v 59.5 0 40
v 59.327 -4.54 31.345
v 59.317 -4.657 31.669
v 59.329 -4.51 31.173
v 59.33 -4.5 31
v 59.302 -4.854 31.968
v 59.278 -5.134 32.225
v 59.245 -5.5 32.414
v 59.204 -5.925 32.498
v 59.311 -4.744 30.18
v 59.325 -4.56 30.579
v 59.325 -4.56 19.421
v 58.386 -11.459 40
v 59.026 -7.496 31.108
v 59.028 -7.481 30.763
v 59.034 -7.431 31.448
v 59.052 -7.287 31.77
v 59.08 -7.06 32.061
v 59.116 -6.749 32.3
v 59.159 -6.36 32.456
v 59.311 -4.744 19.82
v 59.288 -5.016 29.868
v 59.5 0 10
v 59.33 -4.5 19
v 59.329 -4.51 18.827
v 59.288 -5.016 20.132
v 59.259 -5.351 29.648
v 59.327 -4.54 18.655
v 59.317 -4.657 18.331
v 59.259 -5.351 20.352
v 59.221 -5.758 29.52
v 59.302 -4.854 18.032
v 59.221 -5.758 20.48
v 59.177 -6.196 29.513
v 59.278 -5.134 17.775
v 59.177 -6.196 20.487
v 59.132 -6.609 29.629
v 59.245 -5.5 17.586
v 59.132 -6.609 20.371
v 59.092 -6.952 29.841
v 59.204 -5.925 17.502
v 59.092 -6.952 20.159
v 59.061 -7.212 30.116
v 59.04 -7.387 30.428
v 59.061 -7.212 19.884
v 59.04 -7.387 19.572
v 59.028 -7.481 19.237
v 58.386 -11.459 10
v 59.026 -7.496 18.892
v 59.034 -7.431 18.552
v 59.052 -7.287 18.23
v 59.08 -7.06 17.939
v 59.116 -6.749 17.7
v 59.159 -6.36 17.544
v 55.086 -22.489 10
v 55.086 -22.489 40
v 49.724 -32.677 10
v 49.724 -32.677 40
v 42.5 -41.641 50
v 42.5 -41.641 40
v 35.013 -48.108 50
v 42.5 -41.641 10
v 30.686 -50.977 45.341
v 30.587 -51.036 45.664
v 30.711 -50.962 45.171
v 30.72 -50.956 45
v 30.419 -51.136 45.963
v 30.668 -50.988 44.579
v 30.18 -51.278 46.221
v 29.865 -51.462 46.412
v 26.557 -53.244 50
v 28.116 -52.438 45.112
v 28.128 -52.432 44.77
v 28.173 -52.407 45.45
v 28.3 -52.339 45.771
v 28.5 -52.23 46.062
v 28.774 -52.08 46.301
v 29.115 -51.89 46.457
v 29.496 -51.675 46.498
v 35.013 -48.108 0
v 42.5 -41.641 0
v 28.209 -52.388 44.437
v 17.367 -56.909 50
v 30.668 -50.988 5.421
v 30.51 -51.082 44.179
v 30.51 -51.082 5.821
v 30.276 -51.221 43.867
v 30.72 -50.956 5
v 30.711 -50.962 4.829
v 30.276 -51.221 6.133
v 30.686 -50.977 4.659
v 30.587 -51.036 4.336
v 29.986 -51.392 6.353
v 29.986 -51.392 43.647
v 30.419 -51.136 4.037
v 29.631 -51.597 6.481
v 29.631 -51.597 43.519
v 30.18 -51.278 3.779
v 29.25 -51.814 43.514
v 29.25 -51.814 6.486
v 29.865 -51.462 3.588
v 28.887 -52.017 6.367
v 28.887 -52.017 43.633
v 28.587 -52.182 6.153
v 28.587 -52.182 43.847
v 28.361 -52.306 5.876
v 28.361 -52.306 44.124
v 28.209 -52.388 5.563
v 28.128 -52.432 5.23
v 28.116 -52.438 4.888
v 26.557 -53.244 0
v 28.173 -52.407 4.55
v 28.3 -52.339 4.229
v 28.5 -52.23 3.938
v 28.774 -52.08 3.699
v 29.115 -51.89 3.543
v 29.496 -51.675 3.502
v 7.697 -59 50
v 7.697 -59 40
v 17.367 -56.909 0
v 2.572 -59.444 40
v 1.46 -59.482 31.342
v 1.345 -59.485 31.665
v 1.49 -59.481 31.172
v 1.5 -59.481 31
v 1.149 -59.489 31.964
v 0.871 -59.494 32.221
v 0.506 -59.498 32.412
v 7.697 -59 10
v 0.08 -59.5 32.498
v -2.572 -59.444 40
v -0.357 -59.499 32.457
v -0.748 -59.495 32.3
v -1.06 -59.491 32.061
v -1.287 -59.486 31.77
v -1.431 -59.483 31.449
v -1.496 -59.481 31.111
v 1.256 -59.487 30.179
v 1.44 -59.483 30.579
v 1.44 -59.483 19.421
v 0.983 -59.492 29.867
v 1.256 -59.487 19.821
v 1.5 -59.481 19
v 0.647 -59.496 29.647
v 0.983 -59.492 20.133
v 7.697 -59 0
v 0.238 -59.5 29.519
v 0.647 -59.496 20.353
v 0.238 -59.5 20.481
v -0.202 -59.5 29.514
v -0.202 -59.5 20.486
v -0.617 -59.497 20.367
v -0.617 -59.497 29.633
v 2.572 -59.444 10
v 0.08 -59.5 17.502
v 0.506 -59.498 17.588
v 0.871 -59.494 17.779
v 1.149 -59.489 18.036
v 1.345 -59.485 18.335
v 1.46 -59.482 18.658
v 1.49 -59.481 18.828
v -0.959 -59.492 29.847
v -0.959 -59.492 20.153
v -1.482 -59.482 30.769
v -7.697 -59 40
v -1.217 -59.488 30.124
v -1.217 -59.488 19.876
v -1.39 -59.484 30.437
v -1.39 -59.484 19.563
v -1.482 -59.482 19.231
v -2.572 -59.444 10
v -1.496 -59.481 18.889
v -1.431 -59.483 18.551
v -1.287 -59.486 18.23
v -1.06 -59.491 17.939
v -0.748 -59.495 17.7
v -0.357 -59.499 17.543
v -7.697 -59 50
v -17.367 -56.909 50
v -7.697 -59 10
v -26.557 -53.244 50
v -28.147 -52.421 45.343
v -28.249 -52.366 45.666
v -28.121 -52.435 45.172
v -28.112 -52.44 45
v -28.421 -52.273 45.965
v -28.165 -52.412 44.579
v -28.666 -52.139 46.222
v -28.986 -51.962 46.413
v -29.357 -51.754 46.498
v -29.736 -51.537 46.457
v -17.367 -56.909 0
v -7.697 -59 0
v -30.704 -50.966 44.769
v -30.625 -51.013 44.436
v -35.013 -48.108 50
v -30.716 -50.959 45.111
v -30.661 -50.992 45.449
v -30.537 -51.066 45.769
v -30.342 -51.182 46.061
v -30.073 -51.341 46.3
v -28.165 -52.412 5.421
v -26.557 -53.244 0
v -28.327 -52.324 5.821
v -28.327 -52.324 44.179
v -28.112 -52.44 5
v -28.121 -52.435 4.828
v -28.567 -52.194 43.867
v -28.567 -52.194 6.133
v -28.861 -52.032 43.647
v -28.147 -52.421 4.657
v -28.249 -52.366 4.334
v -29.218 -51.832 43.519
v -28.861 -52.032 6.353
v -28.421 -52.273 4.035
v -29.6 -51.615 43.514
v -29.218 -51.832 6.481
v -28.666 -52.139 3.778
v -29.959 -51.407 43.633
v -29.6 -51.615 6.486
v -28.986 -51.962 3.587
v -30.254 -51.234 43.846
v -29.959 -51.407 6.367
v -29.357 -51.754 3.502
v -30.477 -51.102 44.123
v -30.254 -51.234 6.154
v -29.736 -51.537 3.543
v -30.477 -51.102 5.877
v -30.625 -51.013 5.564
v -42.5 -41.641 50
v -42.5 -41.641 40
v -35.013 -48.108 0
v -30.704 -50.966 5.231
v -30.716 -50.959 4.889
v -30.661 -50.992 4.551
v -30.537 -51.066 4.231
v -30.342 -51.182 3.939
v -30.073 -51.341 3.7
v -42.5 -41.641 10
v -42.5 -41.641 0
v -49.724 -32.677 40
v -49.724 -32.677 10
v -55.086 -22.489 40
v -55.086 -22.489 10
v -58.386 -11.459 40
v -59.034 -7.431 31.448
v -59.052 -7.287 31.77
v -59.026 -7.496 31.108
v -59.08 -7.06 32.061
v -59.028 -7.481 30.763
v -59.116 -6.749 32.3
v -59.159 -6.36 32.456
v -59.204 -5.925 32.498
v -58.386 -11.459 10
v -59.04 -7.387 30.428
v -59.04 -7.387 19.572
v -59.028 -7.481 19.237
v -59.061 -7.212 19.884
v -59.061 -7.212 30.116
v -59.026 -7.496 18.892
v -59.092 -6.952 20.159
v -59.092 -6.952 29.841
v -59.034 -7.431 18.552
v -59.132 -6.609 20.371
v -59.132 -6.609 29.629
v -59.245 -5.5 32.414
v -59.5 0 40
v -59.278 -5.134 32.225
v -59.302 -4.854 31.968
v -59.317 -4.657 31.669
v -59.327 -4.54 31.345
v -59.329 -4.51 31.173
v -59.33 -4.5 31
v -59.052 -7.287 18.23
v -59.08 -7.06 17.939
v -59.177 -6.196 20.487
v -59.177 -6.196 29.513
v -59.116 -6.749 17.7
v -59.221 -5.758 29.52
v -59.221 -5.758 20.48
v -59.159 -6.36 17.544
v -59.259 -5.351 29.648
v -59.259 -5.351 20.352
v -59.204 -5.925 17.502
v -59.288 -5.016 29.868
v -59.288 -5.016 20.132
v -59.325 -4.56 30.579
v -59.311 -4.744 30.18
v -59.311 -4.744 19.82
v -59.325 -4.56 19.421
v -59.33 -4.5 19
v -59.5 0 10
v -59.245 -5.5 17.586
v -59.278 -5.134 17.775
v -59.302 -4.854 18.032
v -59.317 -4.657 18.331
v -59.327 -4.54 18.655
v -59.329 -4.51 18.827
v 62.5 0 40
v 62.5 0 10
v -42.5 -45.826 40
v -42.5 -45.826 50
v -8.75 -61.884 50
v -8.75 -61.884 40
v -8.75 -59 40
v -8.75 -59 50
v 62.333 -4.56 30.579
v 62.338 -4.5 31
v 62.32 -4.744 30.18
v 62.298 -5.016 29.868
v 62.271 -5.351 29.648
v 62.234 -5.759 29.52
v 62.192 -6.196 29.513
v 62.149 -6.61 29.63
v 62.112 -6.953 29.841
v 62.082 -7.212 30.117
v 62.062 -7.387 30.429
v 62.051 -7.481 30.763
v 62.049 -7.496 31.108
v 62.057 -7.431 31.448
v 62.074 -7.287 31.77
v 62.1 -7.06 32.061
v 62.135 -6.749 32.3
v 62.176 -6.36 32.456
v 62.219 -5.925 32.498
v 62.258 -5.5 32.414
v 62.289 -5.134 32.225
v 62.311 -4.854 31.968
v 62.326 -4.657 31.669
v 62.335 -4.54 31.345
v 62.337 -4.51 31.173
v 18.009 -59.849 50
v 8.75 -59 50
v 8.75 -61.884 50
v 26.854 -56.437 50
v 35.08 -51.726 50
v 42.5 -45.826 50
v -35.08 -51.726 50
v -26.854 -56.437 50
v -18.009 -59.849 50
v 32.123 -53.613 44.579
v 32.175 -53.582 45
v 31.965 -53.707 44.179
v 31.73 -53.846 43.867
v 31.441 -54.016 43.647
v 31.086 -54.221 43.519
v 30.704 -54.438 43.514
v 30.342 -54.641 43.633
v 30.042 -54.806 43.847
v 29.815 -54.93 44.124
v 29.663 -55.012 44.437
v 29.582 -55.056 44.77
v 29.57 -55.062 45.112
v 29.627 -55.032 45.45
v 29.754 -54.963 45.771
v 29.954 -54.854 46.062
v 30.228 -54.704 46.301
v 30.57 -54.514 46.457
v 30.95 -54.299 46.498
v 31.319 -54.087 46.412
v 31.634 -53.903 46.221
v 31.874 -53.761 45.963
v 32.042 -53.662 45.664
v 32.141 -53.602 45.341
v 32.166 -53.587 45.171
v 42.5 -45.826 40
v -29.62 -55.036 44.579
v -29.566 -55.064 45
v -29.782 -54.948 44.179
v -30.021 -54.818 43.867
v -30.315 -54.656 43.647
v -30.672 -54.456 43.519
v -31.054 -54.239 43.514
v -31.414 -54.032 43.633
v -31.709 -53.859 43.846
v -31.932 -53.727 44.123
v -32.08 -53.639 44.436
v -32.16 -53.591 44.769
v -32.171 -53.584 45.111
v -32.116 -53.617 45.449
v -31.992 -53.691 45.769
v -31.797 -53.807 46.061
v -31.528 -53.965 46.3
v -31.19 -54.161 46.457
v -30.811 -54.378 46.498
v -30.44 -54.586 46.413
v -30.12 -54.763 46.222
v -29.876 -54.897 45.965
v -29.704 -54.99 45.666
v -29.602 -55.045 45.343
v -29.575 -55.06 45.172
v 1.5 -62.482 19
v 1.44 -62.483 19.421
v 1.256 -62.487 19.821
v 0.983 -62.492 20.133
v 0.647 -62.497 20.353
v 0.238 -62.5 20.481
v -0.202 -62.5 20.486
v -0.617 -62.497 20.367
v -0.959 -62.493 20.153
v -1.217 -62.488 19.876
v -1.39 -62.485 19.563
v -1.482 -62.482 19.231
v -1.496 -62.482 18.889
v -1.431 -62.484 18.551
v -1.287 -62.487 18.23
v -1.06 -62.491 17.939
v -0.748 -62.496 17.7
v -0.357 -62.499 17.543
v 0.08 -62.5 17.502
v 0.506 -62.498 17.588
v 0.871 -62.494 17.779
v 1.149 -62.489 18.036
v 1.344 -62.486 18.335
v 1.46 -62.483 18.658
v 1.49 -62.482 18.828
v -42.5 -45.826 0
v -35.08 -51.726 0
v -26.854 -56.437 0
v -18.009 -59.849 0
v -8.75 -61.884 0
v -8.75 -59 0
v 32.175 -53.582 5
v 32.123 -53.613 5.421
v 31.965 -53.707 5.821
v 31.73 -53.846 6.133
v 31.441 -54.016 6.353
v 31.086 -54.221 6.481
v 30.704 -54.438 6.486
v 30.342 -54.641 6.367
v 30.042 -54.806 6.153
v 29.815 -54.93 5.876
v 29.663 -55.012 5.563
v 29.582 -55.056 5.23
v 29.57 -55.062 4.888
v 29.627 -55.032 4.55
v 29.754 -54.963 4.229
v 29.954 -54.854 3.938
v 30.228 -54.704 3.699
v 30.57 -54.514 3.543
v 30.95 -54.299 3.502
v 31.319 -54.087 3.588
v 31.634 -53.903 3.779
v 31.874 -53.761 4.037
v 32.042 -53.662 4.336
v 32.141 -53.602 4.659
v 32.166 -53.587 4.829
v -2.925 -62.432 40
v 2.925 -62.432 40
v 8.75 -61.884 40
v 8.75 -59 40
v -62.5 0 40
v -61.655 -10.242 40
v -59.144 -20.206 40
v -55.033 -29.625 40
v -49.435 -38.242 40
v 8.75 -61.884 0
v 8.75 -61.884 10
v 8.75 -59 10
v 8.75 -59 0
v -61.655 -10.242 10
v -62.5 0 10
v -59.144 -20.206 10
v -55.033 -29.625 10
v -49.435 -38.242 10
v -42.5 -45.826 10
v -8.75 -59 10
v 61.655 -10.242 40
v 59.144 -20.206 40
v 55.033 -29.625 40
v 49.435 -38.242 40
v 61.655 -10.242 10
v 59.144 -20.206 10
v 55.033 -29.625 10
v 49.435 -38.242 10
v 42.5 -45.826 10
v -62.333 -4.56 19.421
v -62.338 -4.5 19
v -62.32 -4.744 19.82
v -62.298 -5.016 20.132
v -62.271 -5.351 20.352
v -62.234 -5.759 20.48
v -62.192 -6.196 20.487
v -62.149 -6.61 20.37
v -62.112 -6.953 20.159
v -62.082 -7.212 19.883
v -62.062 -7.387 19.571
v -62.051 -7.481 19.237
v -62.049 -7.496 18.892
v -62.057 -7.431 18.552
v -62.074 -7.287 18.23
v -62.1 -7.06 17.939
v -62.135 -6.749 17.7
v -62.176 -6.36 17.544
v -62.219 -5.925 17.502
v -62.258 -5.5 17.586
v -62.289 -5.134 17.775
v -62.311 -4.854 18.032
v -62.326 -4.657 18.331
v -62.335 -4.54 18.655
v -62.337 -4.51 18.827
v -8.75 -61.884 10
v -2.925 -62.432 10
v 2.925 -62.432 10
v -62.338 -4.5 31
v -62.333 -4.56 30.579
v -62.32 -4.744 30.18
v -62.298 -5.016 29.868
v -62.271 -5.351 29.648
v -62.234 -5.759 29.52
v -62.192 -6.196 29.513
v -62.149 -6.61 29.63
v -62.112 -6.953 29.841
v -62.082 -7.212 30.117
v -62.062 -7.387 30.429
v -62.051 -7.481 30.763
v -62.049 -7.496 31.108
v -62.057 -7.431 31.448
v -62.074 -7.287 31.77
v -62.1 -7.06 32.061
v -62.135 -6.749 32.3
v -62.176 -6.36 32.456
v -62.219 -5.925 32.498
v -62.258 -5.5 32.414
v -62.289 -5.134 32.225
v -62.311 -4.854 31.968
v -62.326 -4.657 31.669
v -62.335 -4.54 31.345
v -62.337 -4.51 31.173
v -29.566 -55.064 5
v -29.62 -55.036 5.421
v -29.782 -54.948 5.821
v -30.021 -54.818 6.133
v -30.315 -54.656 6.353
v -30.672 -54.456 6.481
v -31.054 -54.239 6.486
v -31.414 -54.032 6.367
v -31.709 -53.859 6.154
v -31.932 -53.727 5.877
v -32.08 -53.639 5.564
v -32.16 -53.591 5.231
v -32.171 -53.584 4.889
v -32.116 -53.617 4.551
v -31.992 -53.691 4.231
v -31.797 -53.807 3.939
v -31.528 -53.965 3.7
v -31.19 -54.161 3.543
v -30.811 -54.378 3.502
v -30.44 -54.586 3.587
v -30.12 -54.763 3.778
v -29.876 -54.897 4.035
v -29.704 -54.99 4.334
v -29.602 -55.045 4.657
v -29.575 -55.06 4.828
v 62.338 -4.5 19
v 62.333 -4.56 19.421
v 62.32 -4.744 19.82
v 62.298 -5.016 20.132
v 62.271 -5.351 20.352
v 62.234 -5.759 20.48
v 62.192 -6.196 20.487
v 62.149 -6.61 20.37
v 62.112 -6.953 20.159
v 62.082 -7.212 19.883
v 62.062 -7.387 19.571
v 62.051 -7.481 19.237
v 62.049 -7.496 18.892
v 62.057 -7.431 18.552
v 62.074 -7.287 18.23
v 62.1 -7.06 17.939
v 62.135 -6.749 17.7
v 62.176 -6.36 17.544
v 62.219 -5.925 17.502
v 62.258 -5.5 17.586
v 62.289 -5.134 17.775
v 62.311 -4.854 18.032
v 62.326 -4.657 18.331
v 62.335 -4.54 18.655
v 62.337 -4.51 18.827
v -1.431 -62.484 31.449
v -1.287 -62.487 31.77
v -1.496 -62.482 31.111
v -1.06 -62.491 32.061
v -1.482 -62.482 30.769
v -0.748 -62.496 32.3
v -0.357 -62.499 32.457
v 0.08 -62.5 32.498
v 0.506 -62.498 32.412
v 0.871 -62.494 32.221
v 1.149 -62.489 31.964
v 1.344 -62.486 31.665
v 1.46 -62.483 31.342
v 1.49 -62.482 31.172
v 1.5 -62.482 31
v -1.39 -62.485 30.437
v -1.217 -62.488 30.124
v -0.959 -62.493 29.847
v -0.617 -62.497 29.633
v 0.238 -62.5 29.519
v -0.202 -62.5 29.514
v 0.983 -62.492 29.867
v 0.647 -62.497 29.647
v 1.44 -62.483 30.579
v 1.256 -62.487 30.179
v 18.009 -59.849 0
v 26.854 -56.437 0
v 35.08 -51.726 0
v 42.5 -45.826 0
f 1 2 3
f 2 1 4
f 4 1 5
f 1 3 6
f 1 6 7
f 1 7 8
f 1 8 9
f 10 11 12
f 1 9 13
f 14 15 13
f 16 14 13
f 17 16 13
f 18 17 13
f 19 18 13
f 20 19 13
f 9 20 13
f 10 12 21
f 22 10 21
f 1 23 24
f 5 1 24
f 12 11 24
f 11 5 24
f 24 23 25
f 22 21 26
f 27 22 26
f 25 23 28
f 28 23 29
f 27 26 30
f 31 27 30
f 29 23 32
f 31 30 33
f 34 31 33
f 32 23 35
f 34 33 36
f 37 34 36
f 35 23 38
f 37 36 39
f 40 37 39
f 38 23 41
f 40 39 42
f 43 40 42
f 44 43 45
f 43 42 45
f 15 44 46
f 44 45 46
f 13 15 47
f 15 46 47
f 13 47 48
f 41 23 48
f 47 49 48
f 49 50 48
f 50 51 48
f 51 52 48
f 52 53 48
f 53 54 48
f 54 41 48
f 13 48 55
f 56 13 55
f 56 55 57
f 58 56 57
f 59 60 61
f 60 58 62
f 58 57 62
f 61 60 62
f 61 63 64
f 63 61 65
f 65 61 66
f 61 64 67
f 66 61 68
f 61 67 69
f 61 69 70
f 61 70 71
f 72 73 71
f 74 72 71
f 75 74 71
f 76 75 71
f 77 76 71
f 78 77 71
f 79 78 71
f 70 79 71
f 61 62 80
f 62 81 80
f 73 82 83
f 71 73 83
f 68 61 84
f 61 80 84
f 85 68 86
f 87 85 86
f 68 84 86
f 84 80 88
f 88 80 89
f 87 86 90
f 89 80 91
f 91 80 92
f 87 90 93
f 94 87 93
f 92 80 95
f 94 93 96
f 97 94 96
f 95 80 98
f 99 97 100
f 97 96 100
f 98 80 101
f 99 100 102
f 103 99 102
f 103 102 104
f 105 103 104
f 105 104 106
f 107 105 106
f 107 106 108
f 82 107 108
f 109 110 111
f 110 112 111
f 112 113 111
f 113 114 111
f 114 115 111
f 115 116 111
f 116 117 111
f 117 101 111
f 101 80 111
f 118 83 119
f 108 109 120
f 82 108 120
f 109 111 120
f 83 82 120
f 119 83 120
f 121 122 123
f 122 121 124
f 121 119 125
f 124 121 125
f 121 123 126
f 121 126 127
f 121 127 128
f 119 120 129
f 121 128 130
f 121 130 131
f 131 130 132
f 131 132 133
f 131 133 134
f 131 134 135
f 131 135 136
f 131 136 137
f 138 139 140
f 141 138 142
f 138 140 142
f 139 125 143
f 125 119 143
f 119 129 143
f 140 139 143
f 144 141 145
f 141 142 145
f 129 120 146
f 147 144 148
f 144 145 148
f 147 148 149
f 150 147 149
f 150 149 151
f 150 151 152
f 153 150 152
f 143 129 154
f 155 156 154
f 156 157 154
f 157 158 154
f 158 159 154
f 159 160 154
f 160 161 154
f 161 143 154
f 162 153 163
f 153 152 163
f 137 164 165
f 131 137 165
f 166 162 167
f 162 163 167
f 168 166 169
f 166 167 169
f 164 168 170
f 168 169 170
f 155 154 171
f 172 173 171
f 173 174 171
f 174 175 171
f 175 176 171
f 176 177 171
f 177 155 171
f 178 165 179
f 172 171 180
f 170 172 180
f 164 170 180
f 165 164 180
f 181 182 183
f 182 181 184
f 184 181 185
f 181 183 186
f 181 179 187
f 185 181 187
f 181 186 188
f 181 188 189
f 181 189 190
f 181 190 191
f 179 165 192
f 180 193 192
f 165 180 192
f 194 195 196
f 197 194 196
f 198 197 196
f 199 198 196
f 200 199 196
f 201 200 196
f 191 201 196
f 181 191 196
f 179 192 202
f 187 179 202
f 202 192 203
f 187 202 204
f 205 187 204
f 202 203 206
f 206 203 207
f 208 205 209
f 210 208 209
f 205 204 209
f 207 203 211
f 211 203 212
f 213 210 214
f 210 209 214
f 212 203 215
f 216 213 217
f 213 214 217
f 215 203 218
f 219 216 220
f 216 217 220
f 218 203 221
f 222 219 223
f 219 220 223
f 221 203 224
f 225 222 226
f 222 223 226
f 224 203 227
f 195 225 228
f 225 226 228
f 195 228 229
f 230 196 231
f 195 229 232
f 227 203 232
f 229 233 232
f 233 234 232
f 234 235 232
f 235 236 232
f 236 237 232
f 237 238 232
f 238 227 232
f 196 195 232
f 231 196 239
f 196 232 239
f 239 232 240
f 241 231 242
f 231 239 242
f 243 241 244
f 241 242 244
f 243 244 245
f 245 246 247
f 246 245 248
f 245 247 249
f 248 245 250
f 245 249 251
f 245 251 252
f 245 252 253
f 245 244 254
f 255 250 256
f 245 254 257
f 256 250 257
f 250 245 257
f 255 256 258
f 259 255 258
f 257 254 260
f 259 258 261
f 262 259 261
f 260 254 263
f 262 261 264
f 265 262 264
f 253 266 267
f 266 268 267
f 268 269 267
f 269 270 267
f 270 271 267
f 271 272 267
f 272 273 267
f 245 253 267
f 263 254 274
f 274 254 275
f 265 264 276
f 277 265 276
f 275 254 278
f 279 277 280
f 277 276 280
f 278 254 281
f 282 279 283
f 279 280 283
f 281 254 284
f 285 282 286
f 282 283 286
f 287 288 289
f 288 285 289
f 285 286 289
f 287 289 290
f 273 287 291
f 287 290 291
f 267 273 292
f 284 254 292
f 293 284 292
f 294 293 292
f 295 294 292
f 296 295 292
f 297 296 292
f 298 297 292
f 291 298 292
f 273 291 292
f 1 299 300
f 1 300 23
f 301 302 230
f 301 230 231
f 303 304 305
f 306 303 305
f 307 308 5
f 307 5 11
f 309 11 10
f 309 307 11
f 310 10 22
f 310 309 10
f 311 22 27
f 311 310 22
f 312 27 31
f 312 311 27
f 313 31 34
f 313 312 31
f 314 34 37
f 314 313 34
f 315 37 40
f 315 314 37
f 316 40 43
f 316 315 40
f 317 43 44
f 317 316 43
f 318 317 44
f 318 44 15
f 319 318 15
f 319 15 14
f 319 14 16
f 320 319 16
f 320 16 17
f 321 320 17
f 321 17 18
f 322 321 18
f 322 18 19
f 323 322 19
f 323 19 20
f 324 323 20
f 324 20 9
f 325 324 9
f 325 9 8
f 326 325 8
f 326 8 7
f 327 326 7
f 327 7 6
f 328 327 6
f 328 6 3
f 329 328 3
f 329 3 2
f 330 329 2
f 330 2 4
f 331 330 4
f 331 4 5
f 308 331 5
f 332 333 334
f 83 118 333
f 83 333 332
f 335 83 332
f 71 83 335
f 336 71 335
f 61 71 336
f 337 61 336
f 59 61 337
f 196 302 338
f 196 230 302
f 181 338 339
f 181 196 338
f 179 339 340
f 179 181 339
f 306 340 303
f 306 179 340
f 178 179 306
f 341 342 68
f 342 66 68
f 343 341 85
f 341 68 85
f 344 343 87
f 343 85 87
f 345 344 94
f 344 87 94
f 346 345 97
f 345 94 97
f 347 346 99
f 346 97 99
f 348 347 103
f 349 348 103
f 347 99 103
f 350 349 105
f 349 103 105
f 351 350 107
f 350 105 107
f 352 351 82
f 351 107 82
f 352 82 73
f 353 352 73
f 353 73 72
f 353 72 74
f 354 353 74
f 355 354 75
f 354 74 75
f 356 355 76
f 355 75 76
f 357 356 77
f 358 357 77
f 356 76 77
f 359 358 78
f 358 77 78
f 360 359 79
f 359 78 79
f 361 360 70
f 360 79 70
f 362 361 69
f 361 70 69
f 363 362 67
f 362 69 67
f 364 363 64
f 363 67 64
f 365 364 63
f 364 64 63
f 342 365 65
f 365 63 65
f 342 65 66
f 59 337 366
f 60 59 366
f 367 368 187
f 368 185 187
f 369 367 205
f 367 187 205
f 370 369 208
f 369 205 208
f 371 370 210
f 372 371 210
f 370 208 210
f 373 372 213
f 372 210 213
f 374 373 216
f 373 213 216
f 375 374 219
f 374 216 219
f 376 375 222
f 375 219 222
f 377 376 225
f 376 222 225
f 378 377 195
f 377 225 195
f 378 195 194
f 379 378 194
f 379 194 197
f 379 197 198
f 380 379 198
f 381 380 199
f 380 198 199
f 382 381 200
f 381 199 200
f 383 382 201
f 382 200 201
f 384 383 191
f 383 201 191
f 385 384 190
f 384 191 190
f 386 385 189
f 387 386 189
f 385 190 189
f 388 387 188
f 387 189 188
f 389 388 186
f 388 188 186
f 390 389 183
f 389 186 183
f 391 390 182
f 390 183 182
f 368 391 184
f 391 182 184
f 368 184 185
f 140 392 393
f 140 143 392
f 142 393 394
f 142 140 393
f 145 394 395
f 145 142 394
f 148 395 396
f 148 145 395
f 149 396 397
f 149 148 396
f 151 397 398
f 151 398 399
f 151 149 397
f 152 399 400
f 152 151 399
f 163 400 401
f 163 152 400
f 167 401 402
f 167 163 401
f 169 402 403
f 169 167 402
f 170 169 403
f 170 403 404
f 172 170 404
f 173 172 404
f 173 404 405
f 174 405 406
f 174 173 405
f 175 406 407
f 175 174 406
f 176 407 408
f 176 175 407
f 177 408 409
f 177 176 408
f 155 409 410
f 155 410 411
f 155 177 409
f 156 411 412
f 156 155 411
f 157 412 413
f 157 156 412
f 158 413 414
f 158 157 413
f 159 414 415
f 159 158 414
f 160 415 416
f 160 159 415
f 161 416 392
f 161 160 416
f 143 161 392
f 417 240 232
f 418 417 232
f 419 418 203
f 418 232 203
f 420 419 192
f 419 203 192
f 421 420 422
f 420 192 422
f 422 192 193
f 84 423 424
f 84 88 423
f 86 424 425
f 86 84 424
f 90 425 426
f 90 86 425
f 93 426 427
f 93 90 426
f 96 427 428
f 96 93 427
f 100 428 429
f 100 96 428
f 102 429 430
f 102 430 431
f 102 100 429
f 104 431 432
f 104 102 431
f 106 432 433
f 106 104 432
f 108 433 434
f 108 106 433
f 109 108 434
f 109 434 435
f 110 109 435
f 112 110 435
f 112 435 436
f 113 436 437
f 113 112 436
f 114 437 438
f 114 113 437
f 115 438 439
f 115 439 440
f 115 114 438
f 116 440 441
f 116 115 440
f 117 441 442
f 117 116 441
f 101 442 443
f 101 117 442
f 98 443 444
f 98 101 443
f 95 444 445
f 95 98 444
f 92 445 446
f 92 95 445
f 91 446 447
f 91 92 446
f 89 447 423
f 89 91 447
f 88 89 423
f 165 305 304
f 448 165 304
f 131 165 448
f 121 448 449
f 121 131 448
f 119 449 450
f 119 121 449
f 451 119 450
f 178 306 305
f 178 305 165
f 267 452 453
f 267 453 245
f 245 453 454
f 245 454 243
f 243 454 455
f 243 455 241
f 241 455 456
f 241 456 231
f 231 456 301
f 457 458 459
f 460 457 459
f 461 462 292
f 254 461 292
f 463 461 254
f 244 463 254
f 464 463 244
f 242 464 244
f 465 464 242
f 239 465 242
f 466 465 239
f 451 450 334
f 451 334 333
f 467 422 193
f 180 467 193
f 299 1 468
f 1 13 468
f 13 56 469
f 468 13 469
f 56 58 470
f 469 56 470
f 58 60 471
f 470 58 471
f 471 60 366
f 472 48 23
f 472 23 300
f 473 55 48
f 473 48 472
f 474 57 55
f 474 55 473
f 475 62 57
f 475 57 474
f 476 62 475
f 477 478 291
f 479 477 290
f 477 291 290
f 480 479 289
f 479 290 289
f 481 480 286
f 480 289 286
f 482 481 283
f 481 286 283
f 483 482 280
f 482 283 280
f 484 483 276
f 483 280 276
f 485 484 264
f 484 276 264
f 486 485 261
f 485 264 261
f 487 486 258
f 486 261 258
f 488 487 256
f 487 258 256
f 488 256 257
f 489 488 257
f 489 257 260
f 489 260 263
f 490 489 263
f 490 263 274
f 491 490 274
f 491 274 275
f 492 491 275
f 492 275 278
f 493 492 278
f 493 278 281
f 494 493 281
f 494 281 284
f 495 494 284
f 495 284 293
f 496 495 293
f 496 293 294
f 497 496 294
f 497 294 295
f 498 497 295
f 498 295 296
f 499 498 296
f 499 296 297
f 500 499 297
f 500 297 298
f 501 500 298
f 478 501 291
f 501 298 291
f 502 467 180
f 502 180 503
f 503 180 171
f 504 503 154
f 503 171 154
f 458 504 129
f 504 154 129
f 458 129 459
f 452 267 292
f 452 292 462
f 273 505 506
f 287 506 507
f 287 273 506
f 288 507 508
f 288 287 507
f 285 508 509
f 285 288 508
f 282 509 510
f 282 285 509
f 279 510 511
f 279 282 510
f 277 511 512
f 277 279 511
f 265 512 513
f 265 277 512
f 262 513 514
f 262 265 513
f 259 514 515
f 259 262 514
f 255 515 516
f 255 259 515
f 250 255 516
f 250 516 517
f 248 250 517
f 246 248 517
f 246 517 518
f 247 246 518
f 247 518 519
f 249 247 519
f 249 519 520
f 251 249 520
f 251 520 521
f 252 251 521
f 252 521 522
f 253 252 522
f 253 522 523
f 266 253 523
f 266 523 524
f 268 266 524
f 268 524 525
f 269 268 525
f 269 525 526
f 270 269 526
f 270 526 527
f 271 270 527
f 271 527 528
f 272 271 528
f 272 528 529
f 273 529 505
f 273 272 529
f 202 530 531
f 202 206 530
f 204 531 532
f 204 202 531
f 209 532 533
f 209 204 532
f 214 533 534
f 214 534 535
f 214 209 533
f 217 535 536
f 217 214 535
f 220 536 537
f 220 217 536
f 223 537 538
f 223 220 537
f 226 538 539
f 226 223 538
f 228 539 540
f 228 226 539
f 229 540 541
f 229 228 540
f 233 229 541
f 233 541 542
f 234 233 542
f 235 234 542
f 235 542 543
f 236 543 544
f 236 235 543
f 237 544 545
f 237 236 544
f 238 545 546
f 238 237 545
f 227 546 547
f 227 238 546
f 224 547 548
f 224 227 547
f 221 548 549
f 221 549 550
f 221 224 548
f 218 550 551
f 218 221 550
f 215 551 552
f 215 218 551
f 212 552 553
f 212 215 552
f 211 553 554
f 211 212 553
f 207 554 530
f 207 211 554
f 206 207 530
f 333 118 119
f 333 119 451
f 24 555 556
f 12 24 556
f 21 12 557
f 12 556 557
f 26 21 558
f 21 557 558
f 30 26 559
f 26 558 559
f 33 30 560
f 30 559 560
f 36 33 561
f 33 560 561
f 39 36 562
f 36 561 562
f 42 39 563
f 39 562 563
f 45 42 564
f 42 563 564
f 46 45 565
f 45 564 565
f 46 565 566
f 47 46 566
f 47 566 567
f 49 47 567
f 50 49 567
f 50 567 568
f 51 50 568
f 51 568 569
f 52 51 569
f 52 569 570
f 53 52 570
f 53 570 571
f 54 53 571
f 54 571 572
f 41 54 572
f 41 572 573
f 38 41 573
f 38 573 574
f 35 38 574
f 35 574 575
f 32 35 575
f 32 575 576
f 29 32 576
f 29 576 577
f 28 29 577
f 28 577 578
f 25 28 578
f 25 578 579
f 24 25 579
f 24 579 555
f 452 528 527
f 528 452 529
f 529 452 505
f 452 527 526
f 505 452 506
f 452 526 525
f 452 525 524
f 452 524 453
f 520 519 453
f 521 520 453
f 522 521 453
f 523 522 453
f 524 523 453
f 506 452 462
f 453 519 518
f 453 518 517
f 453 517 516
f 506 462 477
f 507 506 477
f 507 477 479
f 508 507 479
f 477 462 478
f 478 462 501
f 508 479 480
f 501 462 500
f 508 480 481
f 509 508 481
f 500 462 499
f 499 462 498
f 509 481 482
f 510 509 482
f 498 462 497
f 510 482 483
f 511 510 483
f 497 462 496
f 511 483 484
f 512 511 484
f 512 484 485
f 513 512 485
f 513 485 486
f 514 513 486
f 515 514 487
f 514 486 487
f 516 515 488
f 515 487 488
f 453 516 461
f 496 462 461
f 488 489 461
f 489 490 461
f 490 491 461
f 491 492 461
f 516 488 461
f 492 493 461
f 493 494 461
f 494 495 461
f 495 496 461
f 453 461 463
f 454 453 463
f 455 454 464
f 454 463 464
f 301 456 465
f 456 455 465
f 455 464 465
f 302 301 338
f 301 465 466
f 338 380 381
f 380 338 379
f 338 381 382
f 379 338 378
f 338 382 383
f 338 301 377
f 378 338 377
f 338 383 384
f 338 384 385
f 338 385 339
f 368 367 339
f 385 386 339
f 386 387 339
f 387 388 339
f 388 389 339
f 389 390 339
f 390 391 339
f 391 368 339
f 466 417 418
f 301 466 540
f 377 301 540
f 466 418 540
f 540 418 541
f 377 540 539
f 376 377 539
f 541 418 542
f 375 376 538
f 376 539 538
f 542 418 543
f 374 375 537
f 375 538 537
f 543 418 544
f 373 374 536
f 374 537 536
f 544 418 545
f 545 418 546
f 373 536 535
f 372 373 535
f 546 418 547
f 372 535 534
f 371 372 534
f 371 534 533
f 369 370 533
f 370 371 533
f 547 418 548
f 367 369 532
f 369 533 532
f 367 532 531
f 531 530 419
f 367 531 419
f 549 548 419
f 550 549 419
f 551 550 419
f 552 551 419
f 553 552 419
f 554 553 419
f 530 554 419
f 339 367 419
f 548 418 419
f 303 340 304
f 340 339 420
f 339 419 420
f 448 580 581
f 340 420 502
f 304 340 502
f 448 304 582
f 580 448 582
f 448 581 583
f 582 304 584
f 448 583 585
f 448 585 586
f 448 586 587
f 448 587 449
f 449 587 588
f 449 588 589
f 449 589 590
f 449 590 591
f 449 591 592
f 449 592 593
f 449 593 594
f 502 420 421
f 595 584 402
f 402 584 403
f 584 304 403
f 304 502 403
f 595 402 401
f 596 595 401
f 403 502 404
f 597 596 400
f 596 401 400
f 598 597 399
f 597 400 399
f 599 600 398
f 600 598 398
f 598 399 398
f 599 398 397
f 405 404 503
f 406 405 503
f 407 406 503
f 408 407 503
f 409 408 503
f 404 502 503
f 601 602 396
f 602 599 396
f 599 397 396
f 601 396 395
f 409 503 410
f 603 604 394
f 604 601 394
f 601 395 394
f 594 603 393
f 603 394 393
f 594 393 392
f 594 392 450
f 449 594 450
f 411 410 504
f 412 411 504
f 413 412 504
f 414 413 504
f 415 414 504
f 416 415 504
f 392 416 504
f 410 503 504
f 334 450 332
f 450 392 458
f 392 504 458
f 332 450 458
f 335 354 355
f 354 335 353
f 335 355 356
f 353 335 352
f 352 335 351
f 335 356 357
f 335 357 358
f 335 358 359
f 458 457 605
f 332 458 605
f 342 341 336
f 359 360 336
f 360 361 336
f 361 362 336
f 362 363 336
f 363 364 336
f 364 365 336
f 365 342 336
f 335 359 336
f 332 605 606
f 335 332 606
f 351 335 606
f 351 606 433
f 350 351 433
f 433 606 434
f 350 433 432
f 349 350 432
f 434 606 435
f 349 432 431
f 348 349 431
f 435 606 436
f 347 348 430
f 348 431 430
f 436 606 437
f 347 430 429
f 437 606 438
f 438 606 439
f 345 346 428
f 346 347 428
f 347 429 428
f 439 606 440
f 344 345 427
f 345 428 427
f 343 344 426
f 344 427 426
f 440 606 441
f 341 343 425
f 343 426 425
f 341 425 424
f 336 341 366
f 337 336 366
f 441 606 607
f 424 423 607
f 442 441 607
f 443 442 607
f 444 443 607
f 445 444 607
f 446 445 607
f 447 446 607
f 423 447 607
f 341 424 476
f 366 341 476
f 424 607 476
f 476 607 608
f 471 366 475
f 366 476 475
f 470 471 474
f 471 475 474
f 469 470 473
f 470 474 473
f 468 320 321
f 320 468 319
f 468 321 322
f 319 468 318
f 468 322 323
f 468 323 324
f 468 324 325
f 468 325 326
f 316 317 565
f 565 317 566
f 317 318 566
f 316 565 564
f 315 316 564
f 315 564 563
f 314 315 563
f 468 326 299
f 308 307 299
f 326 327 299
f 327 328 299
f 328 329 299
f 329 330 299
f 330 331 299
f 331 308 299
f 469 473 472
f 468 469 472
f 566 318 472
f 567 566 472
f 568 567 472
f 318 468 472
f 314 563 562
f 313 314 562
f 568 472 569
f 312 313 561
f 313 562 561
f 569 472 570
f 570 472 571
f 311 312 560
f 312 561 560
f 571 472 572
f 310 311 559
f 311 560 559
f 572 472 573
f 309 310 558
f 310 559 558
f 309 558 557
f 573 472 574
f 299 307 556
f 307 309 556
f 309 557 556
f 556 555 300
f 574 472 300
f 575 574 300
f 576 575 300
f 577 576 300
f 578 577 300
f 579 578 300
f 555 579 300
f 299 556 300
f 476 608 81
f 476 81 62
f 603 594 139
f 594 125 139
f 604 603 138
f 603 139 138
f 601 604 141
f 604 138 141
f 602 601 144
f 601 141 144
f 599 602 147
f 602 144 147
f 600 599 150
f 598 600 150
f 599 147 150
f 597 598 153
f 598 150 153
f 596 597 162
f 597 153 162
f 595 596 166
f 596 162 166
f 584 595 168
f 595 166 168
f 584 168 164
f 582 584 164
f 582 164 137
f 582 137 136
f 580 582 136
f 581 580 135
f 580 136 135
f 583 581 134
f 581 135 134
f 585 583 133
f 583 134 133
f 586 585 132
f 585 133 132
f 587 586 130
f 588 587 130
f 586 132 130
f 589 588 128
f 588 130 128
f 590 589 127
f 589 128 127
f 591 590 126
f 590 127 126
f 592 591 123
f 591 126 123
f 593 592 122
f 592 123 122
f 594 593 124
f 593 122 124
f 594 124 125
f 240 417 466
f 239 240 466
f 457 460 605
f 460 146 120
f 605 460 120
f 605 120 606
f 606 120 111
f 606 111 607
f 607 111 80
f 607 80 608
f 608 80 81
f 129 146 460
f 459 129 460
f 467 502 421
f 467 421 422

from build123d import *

# Parameters (mm, degrees)
BOSS_EXTRUDE1_DEPTH = 50
CUT_EXTRUDE2_START  = -63.5
SKETCH3_W           = 20
SKETCH3_H           = 10
CUT_EXTRUDE2_DEPTH  = 64.5
SKETCH4_W           = 17.5
SKETCH4_H           = 7
CUT_EXTRUDE3_DEPTH  = 10
BOSS_EXTRUDE2_DEPTH = 10
CUT_EXTRUDE6_DEPTH  = 10
SKETCH16_R          = 1.5
CUT_EXTRUDE7_DEPTH  = 10
SKETCH17_R          = 1.5
CUT_EXTRUDE8_DEPTH  = 10
CUT_EXTRUDE9_START  = -10
SKETCH18_R          = 1.5
CUT_EXTRUDE9_DEPTH  = 137
SKETCH19_R          = 1.5
CUT_EXTRUDE10_DEPTH = 10


with BuildPart() as part:
    # Sketch1 → Boss-Extrude1 (new body)
    with BuildSketch(Plane.XY):
        with BuildLine():
            ThreePointArc((59.5, 0), (0, -59.5), (-59.5, 0))
            Line((-59.5, 0), (-62.5, 0))
            ThreePointArc((-62.5, 0), (0, -62.5), (62.5, 0))
            Line((62.5, 0), (59.5, 0))
        make_face()
    extrude(amount=BOSS_EXTRUDE1_DEPTH)

    # Sketch3 → Cut-Extrude2 (cut)
    with BuildSketch(Plane(origin=(0, 0, 0), x_dir=(1, 0, 0), z_dir=(0, 1, 0)).offset(CUT_EXTRUDE2_START)):
        with Locations((-52.5, -45)):
            Rectangle(SKETCH3_W, SKETCH3_H)
        with Locations((52.5, -45)):
            Rectangle(SKETCH3_W, SKETCH3_H)
    cut_extrude2 = extrude(amount=CUT_EXTRUDE2_DEPTH, mode=Mode.SUBTRACT)

    # Sketch4 → Cut-Extrude3 (cut)
    with BuildSketch(Plane.XY.offset(50)):
        with Locations((0, -62.5)):
            Rectangle(SKETCH4_W, SKETCH4_H)
    cut_extrude3 = extrude(amount=-CUT_EXTRUDE3_DEPTH, mode=Mode.SUBTRACT)

    # Sketch9 → Boss-Extrude2 (add)
    with BuildSketch(Plane.XY):
        with BuildLine():
            Line((-52.112697755, -24.30055005), (-55.284775009, -25.779713966))
            ThreePointArc((-55.284775009, -25.779713966), (-51.730933866, -32.325075118), (-47.405903649, -38.388543854))
            Line((-47.405903649, -38.388543854), (-44.685892784, -36.185922485))
            ThreePointArc((-44.685892784, -36.185922485), (-48.762765529, -30.470357693), (-52.112697755, -24.30055005))
        make_face()
        with BuildLine():
            ThreePointArc((47.405903649, -38.388543854), (51.730933866, -32.325075118), (55.284775009, -25.779713966))
            Line((55.284775009, -25.779713966), (52.112697755, -24.30055005))
            ThreePointArc((52.112697755, -24.30055005), (48.762765529, -30.470357693), (44.685892784, -36.185922485))
            Line((44.685892784, -36.185922485), (47.405903649, -38.388543854))
        make_face()
        with BuildLine():
            Line((-7.007487246, -57.071403719), (-7.434029948, -60.54531525))
            ThreePointArc((-7.434029948, -60.54531525), (0, -61), (7.434029948, -60.54531525))
            Line((7.434029948, -60.54531525), (7.007487246, -57.071403719))
            ThreePointArc((7.007487246, -57.071403719), (0, -57.5), (-7.007487246, -57.071403719))
        make_face()
    boss_extrude2 = extrude(amount=BOSS_EXTRUDE2_DEPTH)

    # Sketch15 → Cut-Extrude6 (cut)
    with BuildSketch(Plane.XY):
        with BuildLine():
            Line((-52.112697755, -24.30055005), (-55.284775009, -25.779713966))
            ThreePointArc((-55.284775009, -25.779713966), (-51.730933866, -32.325075118), (-47.405903649, -38.388543854))
            Line((-47.405903649, -38.388543854), (-44.685892784, -36.185922485))
            ThreePointArc((-44.685892784, -36.185922485), (-48.762765529, -30.470357693), (-52.112697755, -24.30055005))
        make_face()
        with BuildLine():
            Line((-7.007487246, -57.071403719), (-7.434029948, -60.54531525))
            ThreePointArc((-7.434029948, -60.54531525), (0, -61), (7.434029948, -60.54531525))
            Line((7.434029948, -60.54531525), (7.007487246, -57.071403719))
            ThreePointArc((7.007487246, -57.071403719), (0, -57.5), (-7.007487246, -57.071403719))
        make_face()
        with BuildLine():
            ThreePointArc((47.405903649, -38.388543854), (51.730933866, -32.325075118), (55.284775009, -25.779713966))
            Line((55.284775009, -25.779713966), (52.112697755, -24.30055005))
            ThreePointArc((52.112697755, -24.30055005), (48.762765529, -30.470357693), (44.685892784, -36.185922485))
            Line((44.685892784, -36.185922485), (47.405903649, -38.388543854))
        make_face()
    cut_extrude6 = extrude(amount=CUT_EXTRUDE6_DEPTH, mode=Mode.SUBTRACT)

    # Sketch16 → Cut-Extrude7 (cut, symmetric)
    with BuildSketch(Plane(origin=(-28.846172405, -52.039872575, 0), x_dir=(0.874619707, -0.48480962, 0), z_dir=(0.48480962, 0.874619707, 0))):
        with Locations((-0.663731696, -45)):
            Circle(SKETCH16_R)
    cut_extrude7 = extrude(amount=CUT_EXTRUDE7_DEPTH, both=True, mode=Mode.SUBTRACT)

    # Sketch17 → Cut-Extrude8 (cut, symmetric)
    with BuildSketch(Plane(origin=(28.846172405, -52.039872575, 0), x_dir=(0.874619707, 0.48480962, 0), z_dir=(-0.48480962, 0.874619707, 0))):
        with Locations((0.663731696, -45)):
            Circle(SKETCH17_R)
    cut_extrude8 = extrude(amount=CUT_EXTRUDE8_DEPTH, both=True, mode=Mode.SUBTRACT)

    # Sketch18 → Cut-Extrude9 (cut)
    with BuildSketch(Plane(origin=(59.5, 0, 0), x_dir=(0, 1, 0), z_dir=(-1, 0, 0)).offset(CUT_EXTRUDE9_START)):
        with Locations((-6, -31)):
            Circle(SKETCH18_R)
    cut_extrude9 = extrude(amount=CUT_EXTRUDE9_DEPTH, mode=Mode.SUBTRACT)

    # Sketch19 → Cut-Extrude10 (cut, symmetric)
    with BuildSketch(Plane(origin=(0, -59.5, 0), x_dir=(1, 0, 0), z_dir=(0, 1, 0))):
        with Locations((0, -31)):
            Circle(SKETCH19_R)
    cut_extrude10 = extrude(amount=CUT_EXTRUDE10_DEPTH, both=True, mode=Mode.SUBTRACT)

    # Mirror4: Cut-Extrude2, Cut-Extrude3, Boss-Extrude2, Cut-Extrude6, Cut-Extrude7, Cut-Extrude8, Cut-Extrude9, Cut-Extrude10 across plane
    add(cut_extrude2.mirror(Plane.XY.offset(25)), mode=Mode.SUBTRACT)
    add(cut_extrude3.mirror(Plane.XY.offset(25)), mode=Mode.SUBTRACT)
    add(boss_extrude2.mirror(Plane.XY.offset(25)))
    add(cut_extrude6.mirror(Plane.XY.offset(25)), mode=Mode.SUBTRACT)
    add(cut_extrude7.mirror(Plane.XY.offset(25)), mode=Mode.SUBTRACT)
    add(cut_extrude8.mirror(Plane.XY.offset(25)), mode=Mode.SUBTRACT)
    add(cut_extrude9.mirror(Plane.XY.offset(25)), mode=Mode.SUBTRACT)
    add(cut_extrude10.mirror(Plane.XY.offset(25)), mode=Mode.SUBTRACT)


solid = part.part
